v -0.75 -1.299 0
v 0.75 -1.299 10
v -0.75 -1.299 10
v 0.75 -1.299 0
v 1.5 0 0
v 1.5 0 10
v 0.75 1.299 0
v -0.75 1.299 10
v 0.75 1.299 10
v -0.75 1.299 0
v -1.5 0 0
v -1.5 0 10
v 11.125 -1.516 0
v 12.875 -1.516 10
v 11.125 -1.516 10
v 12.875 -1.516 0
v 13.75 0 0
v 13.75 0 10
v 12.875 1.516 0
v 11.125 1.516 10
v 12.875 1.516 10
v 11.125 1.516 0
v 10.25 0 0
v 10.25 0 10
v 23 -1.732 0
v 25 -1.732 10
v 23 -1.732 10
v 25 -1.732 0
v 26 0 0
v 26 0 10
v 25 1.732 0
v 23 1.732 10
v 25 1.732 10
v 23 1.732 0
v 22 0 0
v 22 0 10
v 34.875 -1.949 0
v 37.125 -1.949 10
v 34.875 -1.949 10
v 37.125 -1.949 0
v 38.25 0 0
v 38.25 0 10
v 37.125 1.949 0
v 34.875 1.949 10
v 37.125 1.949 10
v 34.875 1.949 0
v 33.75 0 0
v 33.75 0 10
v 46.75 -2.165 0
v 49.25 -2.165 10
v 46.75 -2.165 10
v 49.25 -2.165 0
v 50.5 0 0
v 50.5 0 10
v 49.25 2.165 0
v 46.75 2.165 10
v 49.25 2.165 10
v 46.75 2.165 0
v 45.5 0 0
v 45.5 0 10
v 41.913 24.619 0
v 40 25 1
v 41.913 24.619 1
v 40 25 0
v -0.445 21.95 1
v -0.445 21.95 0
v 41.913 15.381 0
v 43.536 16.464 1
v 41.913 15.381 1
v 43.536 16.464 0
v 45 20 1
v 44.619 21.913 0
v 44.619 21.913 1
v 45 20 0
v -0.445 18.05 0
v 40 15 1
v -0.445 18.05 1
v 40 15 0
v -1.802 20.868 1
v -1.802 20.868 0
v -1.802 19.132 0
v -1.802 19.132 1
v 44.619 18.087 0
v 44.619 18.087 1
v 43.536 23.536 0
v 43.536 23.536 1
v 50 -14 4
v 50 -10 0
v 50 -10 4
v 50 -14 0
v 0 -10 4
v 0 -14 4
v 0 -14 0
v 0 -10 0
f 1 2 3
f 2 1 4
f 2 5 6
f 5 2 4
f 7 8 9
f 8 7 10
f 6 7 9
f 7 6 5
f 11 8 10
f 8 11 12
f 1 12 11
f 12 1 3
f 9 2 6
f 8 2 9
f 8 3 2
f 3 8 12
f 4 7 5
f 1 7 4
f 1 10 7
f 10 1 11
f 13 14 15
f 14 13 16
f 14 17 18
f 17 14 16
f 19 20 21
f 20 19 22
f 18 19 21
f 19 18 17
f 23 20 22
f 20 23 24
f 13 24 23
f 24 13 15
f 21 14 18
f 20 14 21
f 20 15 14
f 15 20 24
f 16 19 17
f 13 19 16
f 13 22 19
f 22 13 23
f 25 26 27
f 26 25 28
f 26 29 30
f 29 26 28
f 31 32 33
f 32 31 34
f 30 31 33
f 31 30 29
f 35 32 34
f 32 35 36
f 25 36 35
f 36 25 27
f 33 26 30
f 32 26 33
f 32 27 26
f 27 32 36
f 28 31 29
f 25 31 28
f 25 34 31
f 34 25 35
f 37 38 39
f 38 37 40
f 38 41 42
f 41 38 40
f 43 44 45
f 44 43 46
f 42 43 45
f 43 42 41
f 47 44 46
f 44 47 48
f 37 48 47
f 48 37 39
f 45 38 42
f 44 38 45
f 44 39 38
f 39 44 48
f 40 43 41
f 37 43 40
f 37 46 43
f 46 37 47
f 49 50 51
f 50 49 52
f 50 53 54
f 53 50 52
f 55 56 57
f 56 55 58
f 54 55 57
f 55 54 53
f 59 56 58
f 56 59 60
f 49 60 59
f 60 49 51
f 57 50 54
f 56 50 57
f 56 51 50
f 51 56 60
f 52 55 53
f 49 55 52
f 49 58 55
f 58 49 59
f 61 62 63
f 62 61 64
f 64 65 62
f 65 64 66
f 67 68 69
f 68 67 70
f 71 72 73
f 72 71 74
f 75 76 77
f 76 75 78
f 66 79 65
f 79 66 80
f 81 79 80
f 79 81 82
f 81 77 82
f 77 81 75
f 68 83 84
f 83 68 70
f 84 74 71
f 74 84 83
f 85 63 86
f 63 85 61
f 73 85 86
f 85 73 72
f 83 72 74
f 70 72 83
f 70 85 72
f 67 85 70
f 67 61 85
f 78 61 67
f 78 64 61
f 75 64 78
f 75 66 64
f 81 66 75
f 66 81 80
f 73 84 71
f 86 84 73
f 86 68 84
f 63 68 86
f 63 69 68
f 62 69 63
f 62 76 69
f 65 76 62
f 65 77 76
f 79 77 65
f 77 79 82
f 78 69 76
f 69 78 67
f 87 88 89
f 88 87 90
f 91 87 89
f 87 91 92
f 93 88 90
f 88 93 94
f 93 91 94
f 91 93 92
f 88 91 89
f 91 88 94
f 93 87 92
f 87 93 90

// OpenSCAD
// Control flow, user modules with defaults, ranges, hull, and modifiers.
// Exercises: module + default params, if/else, for over [a:step:b],
// hull(), mirror(), the '#' (highlight) and '%' (background) modifiers,
// and a faceted-prism cylinder ($fn=6).

module pillar(d = 4, h = 12, marked = false) {
    if (marked) #cylinder(d = d, h = h, $fn = 6);
    else cylinder(d = d, h = h, $fn = 6);
}

for (i = [0 : 2 : 8])
    translate([i * 6, 0, 0]) pillar(d = 3 + i / 4, h = 10, marked = (i == 4));

hull() {
    translate([0, 20, 0]) cylinder(r = 2, h = 1);
    translate([40, 20, 0]) cylinder(r = 5, h = 1);
}

mirror([0, 1, 0]) translate([0, 10, 0]) cube([50, 4, 4]);
